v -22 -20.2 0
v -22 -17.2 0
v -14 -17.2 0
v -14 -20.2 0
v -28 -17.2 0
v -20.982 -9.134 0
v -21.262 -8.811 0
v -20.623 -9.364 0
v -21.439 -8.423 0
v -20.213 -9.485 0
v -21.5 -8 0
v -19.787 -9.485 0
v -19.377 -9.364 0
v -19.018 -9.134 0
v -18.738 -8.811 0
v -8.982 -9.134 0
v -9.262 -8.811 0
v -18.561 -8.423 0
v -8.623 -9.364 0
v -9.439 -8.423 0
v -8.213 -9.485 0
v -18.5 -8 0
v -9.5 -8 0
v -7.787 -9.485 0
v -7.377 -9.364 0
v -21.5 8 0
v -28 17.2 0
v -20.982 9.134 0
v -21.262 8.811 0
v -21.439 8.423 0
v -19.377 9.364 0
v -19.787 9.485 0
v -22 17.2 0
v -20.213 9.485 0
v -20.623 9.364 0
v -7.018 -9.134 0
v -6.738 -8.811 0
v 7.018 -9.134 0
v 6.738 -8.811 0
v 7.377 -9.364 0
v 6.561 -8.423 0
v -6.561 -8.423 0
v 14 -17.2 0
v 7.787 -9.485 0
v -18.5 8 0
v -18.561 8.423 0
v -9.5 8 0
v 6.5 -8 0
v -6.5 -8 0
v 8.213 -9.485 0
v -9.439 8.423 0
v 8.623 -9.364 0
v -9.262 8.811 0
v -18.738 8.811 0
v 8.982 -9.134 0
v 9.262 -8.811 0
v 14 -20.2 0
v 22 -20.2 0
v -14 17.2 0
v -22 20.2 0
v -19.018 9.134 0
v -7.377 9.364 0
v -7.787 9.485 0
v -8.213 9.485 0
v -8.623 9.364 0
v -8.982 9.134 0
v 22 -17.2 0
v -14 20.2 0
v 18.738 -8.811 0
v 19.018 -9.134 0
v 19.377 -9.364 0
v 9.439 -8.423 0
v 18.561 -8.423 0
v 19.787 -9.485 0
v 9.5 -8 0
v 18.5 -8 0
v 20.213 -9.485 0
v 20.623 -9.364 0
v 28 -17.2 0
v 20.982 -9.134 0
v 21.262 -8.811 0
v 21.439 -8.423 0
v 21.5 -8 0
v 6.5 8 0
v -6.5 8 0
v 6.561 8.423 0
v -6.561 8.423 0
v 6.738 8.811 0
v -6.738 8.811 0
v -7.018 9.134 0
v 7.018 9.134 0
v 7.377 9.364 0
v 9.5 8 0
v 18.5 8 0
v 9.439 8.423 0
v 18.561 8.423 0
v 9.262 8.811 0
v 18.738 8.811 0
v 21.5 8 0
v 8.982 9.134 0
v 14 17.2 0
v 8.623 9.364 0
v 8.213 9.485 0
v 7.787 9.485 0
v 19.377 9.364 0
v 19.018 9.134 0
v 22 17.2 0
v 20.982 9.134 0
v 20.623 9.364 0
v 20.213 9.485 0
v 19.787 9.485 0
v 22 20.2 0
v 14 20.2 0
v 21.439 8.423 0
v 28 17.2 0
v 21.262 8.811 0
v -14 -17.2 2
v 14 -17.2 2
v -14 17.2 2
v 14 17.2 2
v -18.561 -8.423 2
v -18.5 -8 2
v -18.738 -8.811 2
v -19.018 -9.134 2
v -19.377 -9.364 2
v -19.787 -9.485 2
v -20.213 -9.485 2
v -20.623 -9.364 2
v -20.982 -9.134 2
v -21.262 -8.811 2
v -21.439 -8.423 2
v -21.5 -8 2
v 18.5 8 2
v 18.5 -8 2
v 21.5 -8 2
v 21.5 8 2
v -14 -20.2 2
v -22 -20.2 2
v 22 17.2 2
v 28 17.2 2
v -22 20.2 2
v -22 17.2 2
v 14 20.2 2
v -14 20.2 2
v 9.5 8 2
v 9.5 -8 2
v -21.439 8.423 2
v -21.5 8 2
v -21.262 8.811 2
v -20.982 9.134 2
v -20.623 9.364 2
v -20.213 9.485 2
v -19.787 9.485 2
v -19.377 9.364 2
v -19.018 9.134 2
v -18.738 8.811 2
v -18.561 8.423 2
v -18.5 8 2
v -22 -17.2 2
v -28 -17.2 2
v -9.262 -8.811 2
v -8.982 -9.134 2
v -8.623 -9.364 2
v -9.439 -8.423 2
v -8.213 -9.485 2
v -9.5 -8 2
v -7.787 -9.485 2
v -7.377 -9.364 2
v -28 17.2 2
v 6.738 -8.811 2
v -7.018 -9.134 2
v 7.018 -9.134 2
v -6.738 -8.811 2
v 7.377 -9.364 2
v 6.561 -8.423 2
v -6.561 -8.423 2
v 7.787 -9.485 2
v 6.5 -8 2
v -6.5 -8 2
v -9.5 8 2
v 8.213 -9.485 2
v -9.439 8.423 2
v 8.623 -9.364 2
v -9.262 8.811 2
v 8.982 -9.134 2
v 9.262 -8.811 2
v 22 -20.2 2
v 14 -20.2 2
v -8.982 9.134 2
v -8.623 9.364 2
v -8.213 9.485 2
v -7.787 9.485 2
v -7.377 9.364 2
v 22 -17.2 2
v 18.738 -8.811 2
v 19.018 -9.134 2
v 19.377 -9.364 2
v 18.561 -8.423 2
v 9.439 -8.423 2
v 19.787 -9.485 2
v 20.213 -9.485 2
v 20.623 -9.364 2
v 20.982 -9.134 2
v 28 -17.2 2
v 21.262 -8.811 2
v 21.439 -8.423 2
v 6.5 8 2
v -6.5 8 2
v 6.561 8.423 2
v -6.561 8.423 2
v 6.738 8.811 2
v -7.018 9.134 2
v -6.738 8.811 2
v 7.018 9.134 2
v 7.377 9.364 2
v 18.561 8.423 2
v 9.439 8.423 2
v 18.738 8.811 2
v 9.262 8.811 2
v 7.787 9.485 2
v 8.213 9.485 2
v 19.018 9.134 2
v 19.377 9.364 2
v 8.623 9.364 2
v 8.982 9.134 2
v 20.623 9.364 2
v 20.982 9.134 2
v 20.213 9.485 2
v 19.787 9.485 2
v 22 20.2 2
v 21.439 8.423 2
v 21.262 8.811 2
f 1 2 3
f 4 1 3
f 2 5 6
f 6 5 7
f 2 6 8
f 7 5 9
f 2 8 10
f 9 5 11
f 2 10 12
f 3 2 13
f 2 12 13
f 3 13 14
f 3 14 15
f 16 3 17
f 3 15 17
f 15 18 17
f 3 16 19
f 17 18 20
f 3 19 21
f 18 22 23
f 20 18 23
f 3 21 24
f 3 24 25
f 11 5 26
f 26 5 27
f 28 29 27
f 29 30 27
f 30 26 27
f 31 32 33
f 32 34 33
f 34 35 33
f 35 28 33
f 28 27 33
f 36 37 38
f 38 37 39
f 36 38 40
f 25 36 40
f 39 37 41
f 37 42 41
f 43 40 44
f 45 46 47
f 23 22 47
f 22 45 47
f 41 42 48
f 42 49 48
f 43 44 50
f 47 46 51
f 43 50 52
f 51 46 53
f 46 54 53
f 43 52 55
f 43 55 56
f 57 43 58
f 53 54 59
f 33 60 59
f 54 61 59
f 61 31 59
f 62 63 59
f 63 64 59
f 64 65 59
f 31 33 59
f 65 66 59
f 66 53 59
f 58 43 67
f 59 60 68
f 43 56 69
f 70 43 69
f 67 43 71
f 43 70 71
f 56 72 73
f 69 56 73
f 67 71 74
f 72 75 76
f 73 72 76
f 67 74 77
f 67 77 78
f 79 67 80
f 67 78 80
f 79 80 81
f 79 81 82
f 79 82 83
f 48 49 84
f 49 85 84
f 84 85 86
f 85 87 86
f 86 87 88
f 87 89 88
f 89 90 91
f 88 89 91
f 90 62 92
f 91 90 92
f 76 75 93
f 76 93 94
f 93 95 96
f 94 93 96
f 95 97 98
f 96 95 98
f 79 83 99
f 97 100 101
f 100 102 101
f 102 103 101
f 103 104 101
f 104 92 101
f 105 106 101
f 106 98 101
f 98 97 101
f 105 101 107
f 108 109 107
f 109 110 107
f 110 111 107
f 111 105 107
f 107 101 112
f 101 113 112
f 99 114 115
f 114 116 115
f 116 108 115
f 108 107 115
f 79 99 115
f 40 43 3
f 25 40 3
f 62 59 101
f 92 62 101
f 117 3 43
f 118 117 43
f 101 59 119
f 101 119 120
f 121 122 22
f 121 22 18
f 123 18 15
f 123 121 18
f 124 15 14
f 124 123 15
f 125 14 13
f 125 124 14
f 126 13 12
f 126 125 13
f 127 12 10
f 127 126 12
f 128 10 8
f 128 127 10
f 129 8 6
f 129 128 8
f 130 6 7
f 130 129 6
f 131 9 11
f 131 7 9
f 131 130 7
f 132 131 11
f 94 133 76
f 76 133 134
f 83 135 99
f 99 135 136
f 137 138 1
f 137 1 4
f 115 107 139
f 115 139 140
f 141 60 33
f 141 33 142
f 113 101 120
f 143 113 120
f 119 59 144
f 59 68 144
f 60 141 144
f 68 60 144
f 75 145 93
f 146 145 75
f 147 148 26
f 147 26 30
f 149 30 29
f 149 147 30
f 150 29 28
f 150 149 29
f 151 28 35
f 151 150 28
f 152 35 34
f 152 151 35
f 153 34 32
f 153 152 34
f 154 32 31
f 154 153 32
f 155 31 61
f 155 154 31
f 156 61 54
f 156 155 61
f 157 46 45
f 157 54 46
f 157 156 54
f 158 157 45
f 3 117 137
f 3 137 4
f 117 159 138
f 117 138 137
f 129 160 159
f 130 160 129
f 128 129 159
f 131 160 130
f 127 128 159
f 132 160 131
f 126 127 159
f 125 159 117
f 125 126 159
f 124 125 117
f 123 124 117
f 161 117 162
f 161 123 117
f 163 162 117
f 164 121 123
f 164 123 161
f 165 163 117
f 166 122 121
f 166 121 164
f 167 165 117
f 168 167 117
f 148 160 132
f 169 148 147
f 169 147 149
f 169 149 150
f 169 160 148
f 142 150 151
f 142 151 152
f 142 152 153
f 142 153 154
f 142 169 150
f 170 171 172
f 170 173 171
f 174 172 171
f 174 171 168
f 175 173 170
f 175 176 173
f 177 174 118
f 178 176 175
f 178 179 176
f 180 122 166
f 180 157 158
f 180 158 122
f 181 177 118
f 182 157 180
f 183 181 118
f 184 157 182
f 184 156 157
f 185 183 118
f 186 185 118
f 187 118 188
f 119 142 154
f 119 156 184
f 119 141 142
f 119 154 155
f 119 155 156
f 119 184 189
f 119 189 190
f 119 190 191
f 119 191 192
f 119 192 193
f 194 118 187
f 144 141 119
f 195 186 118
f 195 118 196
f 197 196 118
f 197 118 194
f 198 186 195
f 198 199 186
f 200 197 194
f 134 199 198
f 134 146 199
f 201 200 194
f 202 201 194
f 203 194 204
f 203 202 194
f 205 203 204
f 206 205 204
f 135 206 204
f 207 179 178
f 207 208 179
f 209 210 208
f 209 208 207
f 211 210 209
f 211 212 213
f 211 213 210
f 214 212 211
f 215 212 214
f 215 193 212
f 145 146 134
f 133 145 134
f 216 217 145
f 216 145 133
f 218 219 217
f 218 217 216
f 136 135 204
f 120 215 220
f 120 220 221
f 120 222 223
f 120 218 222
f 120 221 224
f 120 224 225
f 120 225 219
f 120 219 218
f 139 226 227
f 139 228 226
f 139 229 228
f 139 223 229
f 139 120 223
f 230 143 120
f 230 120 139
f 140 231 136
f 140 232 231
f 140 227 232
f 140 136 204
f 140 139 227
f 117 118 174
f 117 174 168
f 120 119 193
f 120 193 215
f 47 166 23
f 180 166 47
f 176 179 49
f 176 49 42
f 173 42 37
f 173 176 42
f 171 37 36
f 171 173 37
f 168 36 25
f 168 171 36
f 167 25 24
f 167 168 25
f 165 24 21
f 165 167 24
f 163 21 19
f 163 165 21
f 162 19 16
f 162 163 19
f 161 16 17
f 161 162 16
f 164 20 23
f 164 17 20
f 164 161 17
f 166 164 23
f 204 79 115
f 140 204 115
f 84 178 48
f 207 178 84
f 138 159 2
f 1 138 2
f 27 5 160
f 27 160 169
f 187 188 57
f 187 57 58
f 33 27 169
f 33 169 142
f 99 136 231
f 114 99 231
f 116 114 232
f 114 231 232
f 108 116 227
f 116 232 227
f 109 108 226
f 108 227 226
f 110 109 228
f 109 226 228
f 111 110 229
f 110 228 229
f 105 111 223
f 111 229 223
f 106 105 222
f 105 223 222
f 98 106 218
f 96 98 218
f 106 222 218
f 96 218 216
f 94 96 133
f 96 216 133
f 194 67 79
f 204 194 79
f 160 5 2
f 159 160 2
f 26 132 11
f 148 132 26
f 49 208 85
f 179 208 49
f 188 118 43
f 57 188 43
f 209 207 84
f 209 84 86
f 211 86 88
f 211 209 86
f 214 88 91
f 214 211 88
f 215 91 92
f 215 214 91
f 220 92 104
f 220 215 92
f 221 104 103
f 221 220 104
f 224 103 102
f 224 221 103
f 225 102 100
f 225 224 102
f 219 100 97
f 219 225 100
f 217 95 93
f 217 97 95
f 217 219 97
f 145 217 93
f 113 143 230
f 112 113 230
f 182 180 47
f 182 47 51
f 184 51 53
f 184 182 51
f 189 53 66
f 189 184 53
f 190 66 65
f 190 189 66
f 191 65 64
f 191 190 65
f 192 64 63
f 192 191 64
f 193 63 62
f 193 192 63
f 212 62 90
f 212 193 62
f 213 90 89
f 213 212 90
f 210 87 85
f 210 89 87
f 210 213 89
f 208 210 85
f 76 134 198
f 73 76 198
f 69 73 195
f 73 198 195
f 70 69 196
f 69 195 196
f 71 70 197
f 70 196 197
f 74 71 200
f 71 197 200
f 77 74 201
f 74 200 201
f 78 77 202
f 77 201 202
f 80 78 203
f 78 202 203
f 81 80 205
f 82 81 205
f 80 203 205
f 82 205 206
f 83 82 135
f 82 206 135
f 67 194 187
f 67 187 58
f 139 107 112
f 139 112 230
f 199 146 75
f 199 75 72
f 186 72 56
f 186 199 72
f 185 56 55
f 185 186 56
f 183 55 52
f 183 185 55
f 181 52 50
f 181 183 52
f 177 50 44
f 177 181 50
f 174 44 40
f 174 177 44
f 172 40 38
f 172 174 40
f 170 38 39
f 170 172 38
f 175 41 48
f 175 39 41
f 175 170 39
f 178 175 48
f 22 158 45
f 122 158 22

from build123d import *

# Parameters (mm, degrees)
SKETCH_1_W               = 56
SKETCH_1_H               = 34.4
EXTRUDE_1_DEPTH          = 2
SKETCH_2_W               = 8
SKETCH_2_H               = 2
EXTRUDE_2_DEPTH          = 6
MIRROR_2_COPY_1_SKETCH_W = 8
MIRROR_2_COPY_1_SKETCH_H = 2
MIRROR_2_COPY_1_DEPTH    = 6
EXTRUDE_3_DEPTH          = 8
EXTRUDE_4_DEPTH          = 8
EXTRUDE_5_DEPTH          = 8
CUT_EXTRUDE_1_DEPTH      = 10
SKETCH_8_W               = 69.954255789
SKETCH_8_H               = 15.282314342
SKETCH_8_W_2             = 75.120108524
SKETCH_8_H_2             = 7.103047511
CUT_EXTRUDE_3_DEPTH      = 2
CUT_EXTRUDE_3_DEPTH_BACK = 3


with BuildPart() as part:
    # 草图1 → 凸台-拉伸1 (new body)
    with BuildSketch(Plane.XY):
        Rectangle(SKETCH_1_W, SKETCH_1_H)
    extrude(amount=EXTRUDE_1_DEPTH)

    # 草图2 → 凸台-拉伸2 (add)
    with BuildSketch(Plane.XZ.offset(17.2)):
        with Locations((-18, 1)):
            Rectangle(SKETCH_2_W, SKETCH_2_H)
    extrude_2 = extrude(amount=EXTRUDE_2_DEPTH)

    # 镜向1: 凸台-拉伸2 across plane
    add(extrude_2.mirror(Plane.ZX))

    # 镜向2: 凸台-拉伸2 across plane
    add(extrude_2.mirror(Plane(origin=(0, 0, 0), x_dir=(0, 0, 1), z_dir=(1, 0, 0))))

    # 镜向2 copy 1 sketch → 镜向2 copy 1 (add)
    with BuildSketch(Plane(origin=(0, 17.2, 0), x_dir=(-1, 0, 0), z_dir=(0, 1, 0))):
        with Locations((-18, 1)):
            Rectangle(MIRROR_2_COPY_1_SKETCH_W, MIRROR_2_COPY_1_SKETCH_H)
    extrude(amount=MIRROR_2_COPY_1_DEPTH)

    # 草图4 → 凸台-拉伸3 (add)
    with BuildSketch(Plane(origin=(-14, 0, 0), x_dir=(0, 0, -1), z_dir=(1, 0, 0))):
        Polygon((-2, -23.2), (-2, -21.7), (-3, -21.7), align=None)
    extrude(amount=-EXTRUDE_3_DEPTH)

    # 草图5 → 凸台-拉伸4 (add)
    with BuildSketch(Plane(origin=(22, 0, 0), x_dir=(0, 0, -1), z_dir=(1, 0, 0))):
        Polygon((-2, -21.7), (-3, -21.7), (-2, -23.2), align=None)
        Polygon((-2, 23.2), (-2, 21.7), (-3, 21.7), align=None)
    extrude(amount=-EXTRUDE_4_DEPTH)

    # 草图6 → 凸台-拉伸5 (add)
    with BuildSketch(Plane(origin=(-14, 0, 0), x_dir=(0, 0, -1), z_dir=(1, 0, 0))):
        Polygon((-2, 23.2), (-2, 21.7), (-3, 21.7), align=None)
    extrude(amount=-EXTRUDE_5_DEPTH)

    # 草图7 → 切除-拉伸1 (cut)
    with BuildSketch(Plane.XY.offset(2)):
        with BuildLine():
            Line((-9.5, -8), (-9.5, 8))
            ThreePointArc((-9.5, 8), (-8, 9.5), (-6.5, 8))
            Line((-6.5, 8), (-6.5, -8))
            ThreePointArc((-6.5, -8), (-8, -9.5), (-9.5, -8))
        make_face()
        with BuildLine():
            Line((-21.5, -8), (-21.5, 8))
            ThreePointArc((-21.5, 8), (-20, 9.5), (-18.5, 8))
            Line((-18.5, 8), (-18.5, -8))
            ThreePointArc((-18.5, -8), (-20, -9.5), (-21.5, -8))
        make_face()
        with BuildLine():
            Line((6.5, -8), (6.5, 8))
            ThreePointArc((6.5, 8), (8, 9.5), (9.5, 8))
            Line((9.5, 8), (9.5, -8))
            ThreePointArc((9.5, -8), (8, -9.5), (6.5, -8))
        make_face()
        with BuildLine():
            Line((21.5, -8), (21.5, 8))
            ThreePointArc((21.5, 8), (20, 9.5), (18.5, 8))
            Line((18.5, 8), (18.5, -8))
            ThreePointArc((18.5, -8), (20, -9.5), (21.5, -8))
        make_face()
    extrude(amount=-CUT_EXTRUDE_1_DEPTH, mode=Mode.SUBTRACT)

    # 草图8 → 切除-拉伸3 (cut, two sides)
    with BuildSketch(Plane.XY.offset(2)) as cut_extrude_3_sk:
        with Locations((4.63474967, 27.841157171)):
            Rectangle(SKETCH_8_W, SKETCH_8_H)
        with Locations((-0.3158592, -23.751523756)):
            Rectangle(SKETCH_8_W_2, SKETCH_8_H_2)
    extrude(amount=CUT_EXTRUDE_3_DEPTH, mode=Mode.SUBTRACT)
    extrude(cut_extrude_3_sk.sketch, amount=-CUT_EXTRUDE_3_DEPTH_BACK, mode=Mode.SUBTRACT)


solid = part.part
